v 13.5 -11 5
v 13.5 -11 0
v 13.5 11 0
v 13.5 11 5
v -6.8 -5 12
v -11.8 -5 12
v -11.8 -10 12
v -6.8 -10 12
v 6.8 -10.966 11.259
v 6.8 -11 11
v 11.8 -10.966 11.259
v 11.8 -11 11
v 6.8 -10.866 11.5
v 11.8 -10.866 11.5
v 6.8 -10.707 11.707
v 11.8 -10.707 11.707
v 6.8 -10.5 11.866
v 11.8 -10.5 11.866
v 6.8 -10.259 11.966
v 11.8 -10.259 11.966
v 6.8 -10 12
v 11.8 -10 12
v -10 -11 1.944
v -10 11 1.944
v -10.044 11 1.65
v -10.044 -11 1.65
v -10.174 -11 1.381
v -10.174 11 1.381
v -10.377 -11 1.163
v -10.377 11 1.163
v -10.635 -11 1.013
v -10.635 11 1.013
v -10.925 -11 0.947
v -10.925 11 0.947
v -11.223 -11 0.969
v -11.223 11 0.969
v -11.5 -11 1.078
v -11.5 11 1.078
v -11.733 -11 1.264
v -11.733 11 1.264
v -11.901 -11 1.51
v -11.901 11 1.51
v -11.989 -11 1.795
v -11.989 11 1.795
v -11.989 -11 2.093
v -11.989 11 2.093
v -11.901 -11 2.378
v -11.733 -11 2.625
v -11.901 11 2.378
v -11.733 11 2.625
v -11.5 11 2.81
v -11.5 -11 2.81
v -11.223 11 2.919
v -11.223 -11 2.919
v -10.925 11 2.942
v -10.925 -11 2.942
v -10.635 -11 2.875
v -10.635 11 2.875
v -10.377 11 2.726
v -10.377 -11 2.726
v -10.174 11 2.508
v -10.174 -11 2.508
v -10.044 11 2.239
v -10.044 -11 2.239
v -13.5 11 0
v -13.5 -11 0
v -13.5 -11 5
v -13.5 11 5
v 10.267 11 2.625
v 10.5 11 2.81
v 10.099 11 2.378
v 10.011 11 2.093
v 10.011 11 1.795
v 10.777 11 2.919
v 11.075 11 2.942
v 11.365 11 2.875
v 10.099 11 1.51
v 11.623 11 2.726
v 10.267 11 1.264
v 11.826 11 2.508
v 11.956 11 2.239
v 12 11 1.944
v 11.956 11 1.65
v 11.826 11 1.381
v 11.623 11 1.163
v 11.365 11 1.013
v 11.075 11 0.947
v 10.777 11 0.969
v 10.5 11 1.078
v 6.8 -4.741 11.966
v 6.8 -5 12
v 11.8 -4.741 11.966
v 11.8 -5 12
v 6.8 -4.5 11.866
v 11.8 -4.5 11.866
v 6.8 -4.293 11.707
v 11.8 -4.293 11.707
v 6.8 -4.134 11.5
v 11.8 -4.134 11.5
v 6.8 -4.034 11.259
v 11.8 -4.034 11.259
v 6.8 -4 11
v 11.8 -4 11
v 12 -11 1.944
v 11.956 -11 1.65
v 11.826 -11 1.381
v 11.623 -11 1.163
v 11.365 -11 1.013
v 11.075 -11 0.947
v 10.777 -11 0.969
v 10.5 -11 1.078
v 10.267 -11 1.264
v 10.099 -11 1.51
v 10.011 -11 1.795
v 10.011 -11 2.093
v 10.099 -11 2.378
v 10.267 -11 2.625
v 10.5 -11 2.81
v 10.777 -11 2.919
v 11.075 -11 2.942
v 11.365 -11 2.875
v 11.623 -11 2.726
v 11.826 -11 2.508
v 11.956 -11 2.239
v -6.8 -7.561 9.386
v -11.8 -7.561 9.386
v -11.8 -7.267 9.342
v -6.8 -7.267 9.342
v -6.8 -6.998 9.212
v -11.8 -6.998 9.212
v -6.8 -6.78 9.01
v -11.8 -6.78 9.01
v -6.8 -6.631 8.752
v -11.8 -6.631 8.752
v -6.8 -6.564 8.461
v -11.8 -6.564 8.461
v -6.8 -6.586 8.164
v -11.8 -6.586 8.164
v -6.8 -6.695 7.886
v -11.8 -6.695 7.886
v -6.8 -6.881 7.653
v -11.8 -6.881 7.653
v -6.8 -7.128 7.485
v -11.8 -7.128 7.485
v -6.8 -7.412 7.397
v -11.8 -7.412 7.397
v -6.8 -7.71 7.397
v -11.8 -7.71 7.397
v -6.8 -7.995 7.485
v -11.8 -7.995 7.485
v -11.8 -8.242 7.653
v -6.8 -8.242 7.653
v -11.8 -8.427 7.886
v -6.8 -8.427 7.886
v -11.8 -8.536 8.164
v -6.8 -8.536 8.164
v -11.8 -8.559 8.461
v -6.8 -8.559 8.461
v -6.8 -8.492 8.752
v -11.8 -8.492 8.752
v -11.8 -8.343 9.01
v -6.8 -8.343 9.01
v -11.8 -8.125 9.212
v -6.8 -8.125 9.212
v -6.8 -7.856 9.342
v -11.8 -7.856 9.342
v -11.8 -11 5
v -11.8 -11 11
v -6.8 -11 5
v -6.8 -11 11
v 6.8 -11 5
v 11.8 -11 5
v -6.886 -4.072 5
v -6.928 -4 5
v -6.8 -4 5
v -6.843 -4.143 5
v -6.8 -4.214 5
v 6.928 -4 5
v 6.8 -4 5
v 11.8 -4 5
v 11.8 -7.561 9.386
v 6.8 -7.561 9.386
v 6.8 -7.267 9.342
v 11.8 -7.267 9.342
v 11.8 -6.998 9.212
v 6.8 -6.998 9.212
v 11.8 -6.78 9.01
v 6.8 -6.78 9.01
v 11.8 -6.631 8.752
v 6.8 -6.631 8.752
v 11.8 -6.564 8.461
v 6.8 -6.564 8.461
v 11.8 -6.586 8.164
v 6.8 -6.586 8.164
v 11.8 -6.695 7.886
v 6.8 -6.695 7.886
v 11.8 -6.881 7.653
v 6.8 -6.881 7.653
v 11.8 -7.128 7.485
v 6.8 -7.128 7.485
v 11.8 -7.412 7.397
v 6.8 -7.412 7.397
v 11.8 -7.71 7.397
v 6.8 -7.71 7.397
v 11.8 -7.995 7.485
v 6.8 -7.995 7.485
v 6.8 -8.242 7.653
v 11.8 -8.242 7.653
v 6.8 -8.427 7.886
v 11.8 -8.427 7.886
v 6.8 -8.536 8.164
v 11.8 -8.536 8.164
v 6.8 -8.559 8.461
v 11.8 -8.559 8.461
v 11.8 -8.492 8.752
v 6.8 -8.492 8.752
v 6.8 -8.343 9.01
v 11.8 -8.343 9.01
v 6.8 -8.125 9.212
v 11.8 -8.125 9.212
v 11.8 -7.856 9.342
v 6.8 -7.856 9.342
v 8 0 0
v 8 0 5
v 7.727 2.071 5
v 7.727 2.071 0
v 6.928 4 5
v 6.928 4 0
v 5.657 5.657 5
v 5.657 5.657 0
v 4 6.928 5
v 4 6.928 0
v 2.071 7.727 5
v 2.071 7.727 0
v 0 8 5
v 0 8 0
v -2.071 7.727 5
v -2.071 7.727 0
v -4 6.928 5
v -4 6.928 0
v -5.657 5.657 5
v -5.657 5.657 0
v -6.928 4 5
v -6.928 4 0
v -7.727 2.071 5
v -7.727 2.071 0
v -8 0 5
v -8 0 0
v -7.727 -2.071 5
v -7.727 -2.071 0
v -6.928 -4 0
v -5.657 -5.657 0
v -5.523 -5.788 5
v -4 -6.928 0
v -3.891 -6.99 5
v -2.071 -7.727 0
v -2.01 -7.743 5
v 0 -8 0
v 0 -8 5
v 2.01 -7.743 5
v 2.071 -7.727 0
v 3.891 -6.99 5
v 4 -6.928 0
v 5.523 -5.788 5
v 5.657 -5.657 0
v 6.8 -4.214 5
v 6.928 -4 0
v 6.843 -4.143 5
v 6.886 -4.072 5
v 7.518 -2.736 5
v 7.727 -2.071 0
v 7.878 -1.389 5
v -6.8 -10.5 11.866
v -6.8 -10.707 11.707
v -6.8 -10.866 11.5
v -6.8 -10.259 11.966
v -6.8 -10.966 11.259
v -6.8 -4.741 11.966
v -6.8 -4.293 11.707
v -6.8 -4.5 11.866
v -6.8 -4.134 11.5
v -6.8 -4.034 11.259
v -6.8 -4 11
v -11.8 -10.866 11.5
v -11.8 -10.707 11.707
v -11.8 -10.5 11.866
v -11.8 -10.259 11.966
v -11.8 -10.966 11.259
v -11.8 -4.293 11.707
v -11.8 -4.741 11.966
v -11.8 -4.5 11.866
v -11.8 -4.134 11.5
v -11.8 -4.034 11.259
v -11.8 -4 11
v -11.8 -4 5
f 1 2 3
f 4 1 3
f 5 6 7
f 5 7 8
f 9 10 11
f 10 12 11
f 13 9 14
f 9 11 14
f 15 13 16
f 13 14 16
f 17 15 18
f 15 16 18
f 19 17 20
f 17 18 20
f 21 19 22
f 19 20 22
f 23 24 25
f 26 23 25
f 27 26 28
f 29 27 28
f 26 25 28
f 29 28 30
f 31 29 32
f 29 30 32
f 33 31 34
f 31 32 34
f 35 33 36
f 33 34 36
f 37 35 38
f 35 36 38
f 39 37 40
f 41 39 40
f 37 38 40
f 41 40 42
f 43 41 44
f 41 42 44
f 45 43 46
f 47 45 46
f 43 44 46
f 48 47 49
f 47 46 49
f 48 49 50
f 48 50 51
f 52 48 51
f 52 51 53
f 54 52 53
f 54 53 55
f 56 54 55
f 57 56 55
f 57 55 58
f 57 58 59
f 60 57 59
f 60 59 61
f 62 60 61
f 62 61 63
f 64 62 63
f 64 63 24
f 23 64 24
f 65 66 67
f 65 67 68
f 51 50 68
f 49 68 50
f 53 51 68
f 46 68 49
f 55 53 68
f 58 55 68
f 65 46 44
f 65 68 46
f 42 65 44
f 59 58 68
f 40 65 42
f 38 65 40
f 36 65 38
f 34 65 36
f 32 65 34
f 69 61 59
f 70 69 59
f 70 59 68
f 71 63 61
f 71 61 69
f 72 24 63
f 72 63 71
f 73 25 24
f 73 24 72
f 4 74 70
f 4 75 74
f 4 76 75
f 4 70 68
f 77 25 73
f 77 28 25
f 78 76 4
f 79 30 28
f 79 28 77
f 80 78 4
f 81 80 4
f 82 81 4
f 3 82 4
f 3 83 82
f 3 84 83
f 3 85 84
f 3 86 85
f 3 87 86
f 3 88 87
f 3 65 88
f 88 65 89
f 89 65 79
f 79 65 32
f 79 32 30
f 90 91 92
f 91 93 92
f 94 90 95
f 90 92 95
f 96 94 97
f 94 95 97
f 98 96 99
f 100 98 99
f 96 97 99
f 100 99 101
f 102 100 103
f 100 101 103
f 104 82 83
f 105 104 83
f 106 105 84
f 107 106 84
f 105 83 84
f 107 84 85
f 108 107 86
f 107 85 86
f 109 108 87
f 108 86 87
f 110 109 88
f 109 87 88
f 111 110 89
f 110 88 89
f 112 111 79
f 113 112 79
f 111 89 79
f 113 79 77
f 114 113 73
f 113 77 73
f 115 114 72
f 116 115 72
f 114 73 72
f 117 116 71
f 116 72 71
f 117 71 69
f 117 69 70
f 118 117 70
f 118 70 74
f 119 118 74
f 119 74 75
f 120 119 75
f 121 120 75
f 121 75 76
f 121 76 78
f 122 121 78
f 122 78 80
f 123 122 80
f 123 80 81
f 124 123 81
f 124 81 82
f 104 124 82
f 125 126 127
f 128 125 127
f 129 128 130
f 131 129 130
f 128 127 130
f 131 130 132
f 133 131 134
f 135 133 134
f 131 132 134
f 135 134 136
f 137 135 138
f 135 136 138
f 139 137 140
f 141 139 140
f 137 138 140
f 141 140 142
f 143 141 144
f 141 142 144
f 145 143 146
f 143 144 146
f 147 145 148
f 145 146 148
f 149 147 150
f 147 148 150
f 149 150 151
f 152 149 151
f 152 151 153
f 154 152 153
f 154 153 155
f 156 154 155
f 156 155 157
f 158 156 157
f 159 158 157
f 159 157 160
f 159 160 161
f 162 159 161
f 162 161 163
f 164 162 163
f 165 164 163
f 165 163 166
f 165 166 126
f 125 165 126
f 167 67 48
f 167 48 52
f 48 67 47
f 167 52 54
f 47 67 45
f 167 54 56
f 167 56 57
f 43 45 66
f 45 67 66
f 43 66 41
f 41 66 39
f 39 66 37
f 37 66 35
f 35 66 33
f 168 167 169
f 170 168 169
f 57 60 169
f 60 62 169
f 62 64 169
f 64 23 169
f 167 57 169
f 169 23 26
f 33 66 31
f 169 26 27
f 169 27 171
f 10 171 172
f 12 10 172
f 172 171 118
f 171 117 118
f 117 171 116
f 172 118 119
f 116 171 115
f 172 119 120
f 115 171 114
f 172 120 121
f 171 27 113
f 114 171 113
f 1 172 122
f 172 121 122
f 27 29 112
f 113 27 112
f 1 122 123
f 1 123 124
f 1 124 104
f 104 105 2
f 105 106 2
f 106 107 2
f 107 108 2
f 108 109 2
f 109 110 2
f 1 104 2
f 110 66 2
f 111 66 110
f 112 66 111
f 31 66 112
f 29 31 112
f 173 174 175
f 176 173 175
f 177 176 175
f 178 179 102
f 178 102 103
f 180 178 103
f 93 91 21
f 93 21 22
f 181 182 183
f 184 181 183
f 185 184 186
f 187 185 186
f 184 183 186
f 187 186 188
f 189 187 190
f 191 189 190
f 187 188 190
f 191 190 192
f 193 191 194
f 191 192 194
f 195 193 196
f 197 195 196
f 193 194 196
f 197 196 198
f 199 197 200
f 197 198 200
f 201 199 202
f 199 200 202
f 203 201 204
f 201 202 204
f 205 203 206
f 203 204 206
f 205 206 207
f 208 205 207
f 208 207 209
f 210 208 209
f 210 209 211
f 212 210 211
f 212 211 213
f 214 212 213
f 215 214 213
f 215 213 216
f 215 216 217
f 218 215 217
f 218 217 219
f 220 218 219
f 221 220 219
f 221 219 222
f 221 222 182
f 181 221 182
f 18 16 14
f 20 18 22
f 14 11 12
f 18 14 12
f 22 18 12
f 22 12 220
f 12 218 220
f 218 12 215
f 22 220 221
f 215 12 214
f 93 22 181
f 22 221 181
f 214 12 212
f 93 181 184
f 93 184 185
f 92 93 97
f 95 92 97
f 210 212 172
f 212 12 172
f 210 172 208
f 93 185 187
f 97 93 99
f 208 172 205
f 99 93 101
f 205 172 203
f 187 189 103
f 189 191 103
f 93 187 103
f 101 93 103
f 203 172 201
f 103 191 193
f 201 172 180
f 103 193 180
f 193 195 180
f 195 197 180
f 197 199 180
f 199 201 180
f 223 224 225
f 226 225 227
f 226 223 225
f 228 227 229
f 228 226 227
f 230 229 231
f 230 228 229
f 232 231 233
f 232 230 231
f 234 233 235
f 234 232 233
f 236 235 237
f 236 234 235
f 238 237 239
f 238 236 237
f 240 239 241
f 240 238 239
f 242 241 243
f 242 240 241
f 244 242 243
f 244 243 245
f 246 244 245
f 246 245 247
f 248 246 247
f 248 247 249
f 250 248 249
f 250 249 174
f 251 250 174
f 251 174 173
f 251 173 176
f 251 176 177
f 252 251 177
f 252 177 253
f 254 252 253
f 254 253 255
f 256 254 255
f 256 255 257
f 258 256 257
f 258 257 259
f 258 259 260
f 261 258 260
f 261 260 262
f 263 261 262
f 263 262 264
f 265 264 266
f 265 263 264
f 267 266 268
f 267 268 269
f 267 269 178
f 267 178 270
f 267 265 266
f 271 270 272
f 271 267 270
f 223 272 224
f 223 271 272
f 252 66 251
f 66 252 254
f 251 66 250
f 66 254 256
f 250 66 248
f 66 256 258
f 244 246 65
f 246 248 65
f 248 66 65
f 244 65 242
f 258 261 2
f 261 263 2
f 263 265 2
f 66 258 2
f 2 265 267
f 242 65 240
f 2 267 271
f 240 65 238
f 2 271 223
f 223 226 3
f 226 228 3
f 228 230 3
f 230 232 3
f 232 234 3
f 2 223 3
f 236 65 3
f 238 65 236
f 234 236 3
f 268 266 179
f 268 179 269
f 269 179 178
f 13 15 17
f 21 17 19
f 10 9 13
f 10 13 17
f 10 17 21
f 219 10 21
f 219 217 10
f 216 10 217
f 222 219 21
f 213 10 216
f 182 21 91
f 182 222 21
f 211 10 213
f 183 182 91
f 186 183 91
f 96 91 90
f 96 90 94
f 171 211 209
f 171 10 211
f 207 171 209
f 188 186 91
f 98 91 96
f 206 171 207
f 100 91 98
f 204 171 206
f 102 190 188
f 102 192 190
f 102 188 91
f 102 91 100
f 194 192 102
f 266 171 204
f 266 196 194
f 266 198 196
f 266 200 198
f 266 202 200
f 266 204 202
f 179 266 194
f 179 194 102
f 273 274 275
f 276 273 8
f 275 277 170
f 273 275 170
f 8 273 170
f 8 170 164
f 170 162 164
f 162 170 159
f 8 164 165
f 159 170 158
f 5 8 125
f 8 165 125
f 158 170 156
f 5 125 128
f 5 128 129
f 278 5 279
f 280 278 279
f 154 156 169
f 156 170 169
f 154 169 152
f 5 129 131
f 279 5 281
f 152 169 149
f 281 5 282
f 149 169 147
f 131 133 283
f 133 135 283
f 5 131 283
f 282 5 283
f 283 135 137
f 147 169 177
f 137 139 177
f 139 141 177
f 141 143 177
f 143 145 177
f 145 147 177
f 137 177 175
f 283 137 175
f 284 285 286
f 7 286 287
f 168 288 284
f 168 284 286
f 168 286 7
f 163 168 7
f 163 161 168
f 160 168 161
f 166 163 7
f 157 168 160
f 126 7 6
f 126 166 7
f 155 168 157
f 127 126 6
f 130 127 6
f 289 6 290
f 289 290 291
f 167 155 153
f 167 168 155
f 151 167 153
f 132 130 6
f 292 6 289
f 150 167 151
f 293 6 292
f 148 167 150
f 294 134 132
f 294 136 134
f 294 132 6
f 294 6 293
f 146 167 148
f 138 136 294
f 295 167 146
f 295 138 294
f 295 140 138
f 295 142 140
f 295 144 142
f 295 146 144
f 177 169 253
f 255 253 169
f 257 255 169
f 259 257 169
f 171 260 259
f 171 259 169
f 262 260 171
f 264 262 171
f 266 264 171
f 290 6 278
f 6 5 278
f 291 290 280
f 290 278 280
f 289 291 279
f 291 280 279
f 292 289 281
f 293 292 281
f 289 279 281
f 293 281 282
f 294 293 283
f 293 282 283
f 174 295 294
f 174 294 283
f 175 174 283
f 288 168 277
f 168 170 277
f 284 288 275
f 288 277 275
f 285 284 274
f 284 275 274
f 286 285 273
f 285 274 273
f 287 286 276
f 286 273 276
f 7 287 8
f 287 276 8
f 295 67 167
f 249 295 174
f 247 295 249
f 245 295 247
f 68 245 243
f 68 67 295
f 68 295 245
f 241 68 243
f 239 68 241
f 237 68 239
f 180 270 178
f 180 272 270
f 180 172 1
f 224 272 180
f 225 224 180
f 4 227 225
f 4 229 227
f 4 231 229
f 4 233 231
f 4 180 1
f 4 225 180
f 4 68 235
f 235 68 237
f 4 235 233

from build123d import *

# Parameters (mm, degrees)
SKETCH1_W           = 27
SKETCH1_H           = 22
SKETCH1_R           = 8
BOSS_EXTRUDE1_DEPTH = 5
SKETCH2_W           = 5
SKETCH2_H           = 7
BOSS_EXTRUDE2_DEPTH = 7
SKETCH3_R           = 1
CUT_EXTRUDE1_DEPTH  = 26.3
FILLET1_R           = 1
SKETCH4_R           = 1
CUT_EXTRUDE2_DEPTH  = 23


with BuildPart() as part:
    # Sketch1 → Boss-Extrude1 (new body)
    with BuildSketch(Plane.XY):
        Rectangle(SKETCH1_W, SKETCH1_H)
        Circle(SKETCH1_R, mode=Mode.SUBTRACT)
    extrude(amount=BOSS_EXTRUDE1_DEPTH)

    # Sketch2 → Boss-Extrude2 (add)
    with BuildSketch(Plane.XY.offset(5)):
        with Locations((-9.3, -7.5)):
            Rectangle(SKETCH2_W, SKETCH2_H)
        with Locations((9.3, -7.5)):
            Rectangle(SKETCH2_W, SKETCH2_H)
    extrude(amount=BOSS_EXTRUDE2_DEPTH)

    # Sketch3 → Cut-Extrude1 (cut, through all)
    with BuildSketch(Plane.ZY.offset(11.8)):
        with Locations((8.386176527, -7.561390553)):
            Circle(SKETCH3_R)
    extrude(amount=-CUT_EXTRUDE1_DEPTH, mode=Mode.SUBTRACT)

    # Fillet1
    fillet1_edges = [part.edges().sort_by_distance(p)[0] for p in [
        (-9.3, -11, 12),
        (-9.3, -4, 12),
        (9.3, -11, 12),
        (9.3, -4, 12),
    ]]
    fillet(fillet1_edges, radius=FILLET1_R)

    # Sketch4 → Cut-Extrude2 (cut, through all)
    with BuildSketch(Plane(origin=(0, 11, 0), x_dir=(1, 0, 0), z_dir=(0, 1, 0))):
        with Locations((-11, -1.944370678)):
            Circle(SKETCH4_R)
        with Locations((11, -1.944370678)):
            Circle(SKETCH4_R)
    extrude(amount=-CUT_EXTRUDE2_DEPTH, mode=Mode.SUBTRACT)


solid = part.part
